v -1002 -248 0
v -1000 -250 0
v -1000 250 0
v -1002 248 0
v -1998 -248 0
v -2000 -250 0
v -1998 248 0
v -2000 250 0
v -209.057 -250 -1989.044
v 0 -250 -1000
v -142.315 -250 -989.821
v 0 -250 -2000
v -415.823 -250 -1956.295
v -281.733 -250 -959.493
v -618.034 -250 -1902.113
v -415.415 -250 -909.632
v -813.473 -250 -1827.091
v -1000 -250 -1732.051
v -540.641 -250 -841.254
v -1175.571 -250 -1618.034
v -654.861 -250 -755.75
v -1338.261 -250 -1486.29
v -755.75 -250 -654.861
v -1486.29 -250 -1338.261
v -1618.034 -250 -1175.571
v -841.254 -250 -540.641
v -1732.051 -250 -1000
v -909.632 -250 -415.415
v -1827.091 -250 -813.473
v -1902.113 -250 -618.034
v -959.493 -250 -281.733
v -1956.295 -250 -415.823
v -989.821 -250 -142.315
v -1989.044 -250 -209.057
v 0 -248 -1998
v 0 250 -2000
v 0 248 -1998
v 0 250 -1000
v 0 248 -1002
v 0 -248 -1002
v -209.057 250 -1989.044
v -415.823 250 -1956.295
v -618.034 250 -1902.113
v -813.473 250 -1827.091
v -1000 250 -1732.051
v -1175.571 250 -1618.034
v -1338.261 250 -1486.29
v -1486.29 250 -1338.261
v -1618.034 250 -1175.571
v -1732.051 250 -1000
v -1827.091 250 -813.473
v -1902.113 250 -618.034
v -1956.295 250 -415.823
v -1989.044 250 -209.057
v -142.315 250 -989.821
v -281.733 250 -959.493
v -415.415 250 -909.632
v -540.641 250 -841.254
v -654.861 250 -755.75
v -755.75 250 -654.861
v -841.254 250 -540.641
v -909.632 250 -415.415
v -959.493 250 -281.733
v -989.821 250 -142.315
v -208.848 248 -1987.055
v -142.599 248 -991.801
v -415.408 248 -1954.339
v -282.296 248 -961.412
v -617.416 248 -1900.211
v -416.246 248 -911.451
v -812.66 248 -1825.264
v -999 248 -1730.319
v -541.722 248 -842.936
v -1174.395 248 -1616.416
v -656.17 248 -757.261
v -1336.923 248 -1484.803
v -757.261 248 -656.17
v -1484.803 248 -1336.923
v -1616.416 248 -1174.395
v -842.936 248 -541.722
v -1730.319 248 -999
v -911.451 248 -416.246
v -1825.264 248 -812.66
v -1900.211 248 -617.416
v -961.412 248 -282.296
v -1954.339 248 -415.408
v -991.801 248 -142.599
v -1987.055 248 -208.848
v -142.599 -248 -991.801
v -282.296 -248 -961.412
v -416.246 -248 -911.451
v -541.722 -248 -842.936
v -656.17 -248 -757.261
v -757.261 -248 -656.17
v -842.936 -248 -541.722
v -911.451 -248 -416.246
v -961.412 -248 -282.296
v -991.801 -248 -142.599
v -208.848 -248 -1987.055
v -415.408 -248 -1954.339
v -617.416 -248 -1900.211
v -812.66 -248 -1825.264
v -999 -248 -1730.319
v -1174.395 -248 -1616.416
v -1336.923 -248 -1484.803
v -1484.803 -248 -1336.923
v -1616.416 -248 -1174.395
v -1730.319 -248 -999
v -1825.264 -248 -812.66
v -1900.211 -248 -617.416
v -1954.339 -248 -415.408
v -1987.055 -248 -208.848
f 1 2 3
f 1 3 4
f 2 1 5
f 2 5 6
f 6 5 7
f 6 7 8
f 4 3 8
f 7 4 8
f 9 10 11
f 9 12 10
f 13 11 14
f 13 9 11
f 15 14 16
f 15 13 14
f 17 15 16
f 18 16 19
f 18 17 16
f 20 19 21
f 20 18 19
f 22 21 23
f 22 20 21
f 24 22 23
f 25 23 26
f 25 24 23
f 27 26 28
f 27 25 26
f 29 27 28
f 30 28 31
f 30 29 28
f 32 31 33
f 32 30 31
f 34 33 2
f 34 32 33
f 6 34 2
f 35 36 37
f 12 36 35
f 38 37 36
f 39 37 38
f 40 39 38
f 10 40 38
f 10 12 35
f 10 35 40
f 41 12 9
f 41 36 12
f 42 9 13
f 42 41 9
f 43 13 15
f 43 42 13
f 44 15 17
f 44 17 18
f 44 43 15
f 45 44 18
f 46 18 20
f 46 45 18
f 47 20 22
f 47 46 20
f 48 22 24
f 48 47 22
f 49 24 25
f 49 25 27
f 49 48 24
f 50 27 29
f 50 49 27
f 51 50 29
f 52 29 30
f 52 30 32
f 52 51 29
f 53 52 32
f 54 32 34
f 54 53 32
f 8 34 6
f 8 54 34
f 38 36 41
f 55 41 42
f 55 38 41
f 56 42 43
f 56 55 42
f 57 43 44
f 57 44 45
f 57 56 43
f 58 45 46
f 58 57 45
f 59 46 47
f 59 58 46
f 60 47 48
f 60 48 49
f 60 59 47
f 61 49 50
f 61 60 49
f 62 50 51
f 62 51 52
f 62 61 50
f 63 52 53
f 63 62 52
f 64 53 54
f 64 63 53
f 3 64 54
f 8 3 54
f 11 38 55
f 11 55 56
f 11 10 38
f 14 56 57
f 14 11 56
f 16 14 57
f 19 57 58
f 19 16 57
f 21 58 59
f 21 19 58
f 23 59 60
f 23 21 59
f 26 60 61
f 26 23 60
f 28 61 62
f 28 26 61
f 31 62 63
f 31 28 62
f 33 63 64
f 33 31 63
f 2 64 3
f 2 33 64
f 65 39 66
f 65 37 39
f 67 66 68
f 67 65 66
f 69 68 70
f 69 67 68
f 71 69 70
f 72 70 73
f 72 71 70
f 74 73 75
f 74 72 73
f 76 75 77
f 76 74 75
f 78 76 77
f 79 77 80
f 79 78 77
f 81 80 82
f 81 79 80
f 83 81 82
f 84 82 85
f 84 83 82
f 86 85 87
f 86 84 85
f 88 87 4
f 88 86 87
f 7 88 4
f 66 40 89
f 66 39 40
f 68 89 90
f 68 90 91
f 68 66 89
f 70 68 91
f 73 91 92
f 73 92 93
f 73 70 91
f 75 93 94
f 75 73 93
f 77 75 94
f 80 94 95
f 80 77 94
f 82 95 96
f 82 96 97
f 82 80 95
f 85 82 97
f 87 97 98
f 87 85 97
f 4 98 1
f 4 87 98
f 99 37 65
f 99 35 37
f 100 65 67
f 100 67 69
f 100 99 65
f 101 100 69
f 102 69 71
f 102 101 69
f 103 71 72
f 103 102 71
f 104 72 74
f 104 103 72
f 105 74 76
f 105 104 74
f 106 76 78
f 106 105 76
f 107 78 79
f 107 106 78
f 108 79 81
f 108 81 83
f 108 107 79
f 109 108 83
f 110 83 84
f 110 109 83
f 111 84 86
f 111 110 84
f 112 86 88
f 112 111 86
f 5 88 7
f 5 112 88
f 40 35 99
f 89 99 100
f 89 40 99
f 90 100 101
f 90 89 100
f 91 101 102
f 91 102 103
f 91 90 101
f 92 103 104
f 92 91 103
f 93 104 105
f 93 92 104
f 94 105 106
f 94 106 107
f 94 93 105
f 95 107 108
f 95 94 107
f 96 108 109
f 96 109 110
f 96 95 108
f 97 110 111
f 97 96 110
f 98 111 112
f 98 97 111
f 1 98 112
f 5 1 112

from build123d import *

# Parameters (mm, degrees)
SKETCH1_W   = 1000
SKETCH1_H   = 500
SKETCH1_W_2 = 996
SKETCH1_H_2 = 496


with BuildPart() as part:
    # Sweep-Thin1: sweep along a path in ElbowArc
    with BuildLine(Plane(origin=(0, 0, 0), x_dir=(1, 0, 0), z_dir=(0, 1, 0))) as sweep_thin1_path:
        ThreePointArc((0, 1500), (-1060.66017178, 1060.66017178), (-1500, 0))
    # Sketch1 → Sweep-Thin1 (sweep)
    with BuildSketch(Plane(origin=(0, 0, 0), x_dir=(0, 0, -1), z_dir=(1, 0, 0))):
        with Locations((1500, 0)):
            Rectangle(SKETCH1_W, SKETCH1_H)
        with Locations((1500, 0)):
            Rectangle(SKETCH1_W_2, SKETCH1_H_2, mode=Mode.SUBTRACT)
    sweep(path=sweep_thin1_path.line)


solid = part.part
